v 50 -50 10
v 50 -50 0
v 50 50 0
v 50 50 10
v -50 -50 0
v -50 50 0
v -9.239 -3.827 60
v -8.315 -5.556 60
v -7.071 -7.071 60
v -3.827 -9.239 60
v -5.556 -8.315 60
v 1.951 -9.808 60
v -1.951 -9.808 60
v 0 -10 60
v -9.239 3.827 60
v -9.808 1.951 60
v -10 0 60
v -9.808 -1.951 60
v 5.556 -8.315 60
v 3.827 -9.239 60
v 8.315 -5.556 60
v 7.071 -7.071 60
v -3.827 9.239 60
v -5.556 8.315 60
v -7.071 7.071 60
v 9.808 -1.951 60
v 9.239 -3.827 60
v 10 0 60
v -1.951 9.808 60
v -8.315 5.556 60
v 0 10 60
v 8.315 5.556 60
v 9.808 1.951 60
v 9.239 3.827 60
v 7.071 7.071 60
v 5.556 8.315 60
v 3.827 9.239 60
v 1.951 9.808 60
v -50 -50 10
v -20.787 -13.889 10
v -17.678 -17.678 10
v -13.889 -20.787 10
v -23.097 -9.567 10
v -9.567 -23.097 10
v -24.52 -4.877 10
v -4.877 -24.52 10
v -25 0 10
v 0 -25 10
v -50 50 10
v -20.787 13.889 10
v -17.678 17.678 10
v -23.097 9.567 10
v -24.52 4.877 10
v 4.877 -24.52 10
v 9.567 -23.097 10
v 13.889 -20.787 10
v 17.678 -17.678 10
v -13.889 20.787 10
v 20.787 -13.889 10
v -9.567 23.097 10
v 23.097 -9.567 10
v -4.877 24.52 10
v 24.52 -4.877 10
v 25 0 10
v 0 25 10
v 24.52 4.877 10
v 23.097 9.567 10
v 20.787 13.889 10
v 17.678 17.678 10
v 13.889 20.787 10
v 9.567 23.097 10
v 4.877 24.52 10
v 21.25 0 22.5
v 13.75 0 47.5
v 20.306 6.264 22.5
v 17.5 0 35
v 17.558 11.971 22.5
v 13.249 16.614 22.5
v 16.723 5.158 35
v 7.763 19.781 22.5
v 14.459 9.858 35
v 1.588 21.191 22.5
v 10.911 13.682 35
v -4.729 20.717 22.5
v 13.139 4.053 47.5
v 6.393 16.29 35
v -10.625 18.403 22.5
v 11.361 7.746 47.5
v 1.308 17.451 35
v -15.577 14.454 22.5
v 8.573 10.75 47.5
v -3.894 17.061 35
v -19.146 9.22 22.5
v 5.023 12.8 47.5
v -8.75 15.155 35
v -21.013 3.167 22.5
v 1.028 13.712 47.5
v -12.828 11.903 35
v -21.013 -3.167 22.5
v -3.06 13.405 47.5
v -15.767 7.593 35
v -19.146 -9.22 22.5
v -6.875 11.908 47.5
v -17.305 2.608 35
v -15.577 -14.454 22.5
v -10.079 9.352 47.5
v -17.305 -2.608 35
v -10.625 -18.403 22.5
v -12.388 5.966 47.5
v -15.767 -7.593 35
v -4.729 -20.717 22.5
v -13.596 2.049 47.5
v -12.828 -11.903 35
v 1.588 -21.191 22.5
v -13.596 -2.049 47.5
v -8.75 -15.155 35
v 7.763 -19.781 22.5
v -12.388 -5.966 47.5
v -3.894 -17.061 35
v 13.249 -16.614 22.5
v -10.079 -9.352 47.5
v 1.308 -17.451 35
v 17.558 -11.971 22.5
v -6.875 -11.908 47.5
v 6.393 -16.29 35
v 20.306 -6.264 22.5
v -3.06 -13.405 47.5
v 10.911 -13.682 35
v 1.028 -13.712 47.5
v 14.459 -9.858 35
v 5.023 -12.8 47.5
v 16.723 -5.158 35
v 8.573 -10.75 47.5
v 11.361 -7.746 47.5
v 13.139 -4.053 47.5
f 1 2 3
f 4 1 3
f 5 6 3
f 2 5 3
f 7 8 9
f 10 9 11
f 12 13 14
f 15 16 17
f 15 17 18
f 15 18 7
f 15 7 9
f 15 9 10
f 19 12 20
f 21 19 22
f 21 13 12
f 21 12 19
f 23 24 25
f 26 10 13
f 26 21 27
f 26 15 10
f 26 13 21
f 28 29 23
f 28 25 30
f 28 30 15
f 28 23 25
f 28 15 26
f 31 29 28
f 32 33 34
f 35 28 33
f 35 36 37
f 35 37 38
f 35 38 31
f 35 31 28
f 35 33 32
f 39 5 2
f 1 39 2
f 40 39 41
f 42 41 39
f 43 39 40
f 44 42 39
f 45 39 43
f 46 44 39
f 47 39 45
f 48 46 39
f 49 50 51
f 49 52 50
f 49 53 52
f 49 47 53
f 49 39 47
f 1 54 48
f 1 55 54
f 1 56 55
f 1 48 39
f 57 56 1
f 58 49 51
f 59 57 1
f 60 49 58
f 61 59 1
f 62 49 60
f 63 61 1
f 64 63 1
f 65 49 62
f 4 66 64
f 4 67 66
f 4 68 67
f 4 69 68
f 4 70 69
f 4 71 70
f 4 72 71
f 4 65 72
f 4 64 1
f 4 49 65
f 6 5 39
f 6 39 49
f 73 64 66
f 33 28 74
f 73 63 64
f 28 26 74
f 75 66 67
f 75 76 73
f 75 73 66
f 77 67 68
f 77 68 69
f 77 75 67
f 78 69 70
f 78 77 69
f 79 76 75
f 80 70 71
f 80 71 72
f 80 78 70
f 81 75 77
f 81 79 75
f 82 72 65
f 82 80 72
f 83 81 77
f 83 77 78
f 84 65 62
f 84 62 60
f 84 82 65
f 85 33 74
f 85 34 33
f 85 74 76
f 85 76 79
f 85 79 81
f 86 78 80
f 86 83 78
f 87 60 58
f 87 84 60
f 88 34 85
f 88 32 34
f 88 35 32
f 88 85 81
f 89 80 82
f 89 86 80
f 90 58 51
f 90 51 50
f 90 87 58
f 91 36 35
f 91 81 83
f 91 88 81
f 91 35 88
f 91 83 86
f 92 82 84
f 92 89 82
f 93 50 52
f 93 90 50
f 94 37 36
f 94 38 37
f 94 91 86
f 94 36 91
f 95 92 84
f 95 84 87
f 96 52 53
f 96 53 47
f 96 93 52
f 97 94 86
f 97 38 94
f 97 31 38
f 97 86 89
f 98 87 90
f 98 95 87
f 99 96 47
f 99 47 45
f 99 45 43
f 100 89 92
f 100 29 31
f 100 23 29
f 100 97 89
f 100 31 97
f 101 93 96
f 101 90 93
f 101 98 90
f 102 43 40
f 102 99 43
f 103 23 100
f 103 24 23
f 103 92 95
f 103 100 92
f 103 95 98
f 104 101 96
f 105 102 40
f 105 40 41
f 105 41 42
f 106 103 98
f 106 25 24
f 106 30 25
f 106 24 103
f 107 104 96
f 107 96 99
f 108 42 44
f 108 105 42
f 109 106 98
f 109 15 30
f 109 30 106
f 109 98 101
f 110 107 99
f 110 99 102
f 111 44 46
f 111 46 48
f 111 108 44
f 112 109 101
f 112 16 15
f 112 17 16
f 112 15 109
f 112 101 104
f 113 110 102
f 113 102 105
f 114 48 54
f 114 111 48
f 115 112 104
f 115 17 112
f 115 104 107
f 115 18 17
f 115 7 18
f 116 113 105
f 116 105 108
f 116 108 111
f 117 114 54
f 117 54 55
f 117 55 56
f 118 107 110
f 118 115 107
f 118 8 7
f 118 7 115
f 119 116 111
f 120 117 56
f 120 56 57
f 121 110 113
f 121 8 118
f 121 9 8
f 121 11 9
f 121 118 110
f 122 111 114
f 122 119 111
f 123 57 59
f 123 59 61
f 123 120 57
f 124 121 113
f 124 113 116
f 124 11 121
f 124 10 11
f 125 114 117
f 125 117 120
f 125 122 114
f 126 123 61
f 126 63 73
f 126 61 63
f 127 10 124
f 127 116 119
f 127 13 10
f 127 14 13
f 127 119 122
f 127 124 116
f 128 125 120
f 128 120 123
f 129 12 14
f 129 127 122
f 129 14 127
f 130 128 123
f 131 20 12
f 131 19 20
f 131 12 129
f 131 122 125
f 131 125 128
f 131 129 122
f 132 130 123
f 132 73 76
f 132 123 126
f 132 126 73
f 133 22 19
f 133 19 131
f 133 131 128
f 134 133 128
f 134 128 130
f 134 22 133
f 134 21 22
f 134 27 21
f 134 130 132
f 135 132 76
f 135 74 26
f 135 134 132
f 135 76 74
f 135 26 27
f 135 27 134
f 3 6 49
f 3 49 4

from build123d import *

# Parameters (mm, degrees)
SKETCH_W  = 100
SKETCH_H  = 100
PAD_DEPTH = 10


with BuildPart() as part:
    # Sketch → Pad (new body)
    with BuildSketch(Plane.XY):
        Rectangle(SKETCH_W, SKETCH_H)
    extrude(amount=PAD_DEPTH)

    # Cone → Cone (revolve)
    with BuildSketch(Plane(origin=(0, 0, 10), x_dir=(1, 0, 0), z_dir=(0, -1, 0))):
        Polygon((0, 0), (25, 0), (10, 50), (0, 50), align=None)
    revolve(axis=Axis((0, 0, 10), (0, 0, 1)))


solid = part.part
